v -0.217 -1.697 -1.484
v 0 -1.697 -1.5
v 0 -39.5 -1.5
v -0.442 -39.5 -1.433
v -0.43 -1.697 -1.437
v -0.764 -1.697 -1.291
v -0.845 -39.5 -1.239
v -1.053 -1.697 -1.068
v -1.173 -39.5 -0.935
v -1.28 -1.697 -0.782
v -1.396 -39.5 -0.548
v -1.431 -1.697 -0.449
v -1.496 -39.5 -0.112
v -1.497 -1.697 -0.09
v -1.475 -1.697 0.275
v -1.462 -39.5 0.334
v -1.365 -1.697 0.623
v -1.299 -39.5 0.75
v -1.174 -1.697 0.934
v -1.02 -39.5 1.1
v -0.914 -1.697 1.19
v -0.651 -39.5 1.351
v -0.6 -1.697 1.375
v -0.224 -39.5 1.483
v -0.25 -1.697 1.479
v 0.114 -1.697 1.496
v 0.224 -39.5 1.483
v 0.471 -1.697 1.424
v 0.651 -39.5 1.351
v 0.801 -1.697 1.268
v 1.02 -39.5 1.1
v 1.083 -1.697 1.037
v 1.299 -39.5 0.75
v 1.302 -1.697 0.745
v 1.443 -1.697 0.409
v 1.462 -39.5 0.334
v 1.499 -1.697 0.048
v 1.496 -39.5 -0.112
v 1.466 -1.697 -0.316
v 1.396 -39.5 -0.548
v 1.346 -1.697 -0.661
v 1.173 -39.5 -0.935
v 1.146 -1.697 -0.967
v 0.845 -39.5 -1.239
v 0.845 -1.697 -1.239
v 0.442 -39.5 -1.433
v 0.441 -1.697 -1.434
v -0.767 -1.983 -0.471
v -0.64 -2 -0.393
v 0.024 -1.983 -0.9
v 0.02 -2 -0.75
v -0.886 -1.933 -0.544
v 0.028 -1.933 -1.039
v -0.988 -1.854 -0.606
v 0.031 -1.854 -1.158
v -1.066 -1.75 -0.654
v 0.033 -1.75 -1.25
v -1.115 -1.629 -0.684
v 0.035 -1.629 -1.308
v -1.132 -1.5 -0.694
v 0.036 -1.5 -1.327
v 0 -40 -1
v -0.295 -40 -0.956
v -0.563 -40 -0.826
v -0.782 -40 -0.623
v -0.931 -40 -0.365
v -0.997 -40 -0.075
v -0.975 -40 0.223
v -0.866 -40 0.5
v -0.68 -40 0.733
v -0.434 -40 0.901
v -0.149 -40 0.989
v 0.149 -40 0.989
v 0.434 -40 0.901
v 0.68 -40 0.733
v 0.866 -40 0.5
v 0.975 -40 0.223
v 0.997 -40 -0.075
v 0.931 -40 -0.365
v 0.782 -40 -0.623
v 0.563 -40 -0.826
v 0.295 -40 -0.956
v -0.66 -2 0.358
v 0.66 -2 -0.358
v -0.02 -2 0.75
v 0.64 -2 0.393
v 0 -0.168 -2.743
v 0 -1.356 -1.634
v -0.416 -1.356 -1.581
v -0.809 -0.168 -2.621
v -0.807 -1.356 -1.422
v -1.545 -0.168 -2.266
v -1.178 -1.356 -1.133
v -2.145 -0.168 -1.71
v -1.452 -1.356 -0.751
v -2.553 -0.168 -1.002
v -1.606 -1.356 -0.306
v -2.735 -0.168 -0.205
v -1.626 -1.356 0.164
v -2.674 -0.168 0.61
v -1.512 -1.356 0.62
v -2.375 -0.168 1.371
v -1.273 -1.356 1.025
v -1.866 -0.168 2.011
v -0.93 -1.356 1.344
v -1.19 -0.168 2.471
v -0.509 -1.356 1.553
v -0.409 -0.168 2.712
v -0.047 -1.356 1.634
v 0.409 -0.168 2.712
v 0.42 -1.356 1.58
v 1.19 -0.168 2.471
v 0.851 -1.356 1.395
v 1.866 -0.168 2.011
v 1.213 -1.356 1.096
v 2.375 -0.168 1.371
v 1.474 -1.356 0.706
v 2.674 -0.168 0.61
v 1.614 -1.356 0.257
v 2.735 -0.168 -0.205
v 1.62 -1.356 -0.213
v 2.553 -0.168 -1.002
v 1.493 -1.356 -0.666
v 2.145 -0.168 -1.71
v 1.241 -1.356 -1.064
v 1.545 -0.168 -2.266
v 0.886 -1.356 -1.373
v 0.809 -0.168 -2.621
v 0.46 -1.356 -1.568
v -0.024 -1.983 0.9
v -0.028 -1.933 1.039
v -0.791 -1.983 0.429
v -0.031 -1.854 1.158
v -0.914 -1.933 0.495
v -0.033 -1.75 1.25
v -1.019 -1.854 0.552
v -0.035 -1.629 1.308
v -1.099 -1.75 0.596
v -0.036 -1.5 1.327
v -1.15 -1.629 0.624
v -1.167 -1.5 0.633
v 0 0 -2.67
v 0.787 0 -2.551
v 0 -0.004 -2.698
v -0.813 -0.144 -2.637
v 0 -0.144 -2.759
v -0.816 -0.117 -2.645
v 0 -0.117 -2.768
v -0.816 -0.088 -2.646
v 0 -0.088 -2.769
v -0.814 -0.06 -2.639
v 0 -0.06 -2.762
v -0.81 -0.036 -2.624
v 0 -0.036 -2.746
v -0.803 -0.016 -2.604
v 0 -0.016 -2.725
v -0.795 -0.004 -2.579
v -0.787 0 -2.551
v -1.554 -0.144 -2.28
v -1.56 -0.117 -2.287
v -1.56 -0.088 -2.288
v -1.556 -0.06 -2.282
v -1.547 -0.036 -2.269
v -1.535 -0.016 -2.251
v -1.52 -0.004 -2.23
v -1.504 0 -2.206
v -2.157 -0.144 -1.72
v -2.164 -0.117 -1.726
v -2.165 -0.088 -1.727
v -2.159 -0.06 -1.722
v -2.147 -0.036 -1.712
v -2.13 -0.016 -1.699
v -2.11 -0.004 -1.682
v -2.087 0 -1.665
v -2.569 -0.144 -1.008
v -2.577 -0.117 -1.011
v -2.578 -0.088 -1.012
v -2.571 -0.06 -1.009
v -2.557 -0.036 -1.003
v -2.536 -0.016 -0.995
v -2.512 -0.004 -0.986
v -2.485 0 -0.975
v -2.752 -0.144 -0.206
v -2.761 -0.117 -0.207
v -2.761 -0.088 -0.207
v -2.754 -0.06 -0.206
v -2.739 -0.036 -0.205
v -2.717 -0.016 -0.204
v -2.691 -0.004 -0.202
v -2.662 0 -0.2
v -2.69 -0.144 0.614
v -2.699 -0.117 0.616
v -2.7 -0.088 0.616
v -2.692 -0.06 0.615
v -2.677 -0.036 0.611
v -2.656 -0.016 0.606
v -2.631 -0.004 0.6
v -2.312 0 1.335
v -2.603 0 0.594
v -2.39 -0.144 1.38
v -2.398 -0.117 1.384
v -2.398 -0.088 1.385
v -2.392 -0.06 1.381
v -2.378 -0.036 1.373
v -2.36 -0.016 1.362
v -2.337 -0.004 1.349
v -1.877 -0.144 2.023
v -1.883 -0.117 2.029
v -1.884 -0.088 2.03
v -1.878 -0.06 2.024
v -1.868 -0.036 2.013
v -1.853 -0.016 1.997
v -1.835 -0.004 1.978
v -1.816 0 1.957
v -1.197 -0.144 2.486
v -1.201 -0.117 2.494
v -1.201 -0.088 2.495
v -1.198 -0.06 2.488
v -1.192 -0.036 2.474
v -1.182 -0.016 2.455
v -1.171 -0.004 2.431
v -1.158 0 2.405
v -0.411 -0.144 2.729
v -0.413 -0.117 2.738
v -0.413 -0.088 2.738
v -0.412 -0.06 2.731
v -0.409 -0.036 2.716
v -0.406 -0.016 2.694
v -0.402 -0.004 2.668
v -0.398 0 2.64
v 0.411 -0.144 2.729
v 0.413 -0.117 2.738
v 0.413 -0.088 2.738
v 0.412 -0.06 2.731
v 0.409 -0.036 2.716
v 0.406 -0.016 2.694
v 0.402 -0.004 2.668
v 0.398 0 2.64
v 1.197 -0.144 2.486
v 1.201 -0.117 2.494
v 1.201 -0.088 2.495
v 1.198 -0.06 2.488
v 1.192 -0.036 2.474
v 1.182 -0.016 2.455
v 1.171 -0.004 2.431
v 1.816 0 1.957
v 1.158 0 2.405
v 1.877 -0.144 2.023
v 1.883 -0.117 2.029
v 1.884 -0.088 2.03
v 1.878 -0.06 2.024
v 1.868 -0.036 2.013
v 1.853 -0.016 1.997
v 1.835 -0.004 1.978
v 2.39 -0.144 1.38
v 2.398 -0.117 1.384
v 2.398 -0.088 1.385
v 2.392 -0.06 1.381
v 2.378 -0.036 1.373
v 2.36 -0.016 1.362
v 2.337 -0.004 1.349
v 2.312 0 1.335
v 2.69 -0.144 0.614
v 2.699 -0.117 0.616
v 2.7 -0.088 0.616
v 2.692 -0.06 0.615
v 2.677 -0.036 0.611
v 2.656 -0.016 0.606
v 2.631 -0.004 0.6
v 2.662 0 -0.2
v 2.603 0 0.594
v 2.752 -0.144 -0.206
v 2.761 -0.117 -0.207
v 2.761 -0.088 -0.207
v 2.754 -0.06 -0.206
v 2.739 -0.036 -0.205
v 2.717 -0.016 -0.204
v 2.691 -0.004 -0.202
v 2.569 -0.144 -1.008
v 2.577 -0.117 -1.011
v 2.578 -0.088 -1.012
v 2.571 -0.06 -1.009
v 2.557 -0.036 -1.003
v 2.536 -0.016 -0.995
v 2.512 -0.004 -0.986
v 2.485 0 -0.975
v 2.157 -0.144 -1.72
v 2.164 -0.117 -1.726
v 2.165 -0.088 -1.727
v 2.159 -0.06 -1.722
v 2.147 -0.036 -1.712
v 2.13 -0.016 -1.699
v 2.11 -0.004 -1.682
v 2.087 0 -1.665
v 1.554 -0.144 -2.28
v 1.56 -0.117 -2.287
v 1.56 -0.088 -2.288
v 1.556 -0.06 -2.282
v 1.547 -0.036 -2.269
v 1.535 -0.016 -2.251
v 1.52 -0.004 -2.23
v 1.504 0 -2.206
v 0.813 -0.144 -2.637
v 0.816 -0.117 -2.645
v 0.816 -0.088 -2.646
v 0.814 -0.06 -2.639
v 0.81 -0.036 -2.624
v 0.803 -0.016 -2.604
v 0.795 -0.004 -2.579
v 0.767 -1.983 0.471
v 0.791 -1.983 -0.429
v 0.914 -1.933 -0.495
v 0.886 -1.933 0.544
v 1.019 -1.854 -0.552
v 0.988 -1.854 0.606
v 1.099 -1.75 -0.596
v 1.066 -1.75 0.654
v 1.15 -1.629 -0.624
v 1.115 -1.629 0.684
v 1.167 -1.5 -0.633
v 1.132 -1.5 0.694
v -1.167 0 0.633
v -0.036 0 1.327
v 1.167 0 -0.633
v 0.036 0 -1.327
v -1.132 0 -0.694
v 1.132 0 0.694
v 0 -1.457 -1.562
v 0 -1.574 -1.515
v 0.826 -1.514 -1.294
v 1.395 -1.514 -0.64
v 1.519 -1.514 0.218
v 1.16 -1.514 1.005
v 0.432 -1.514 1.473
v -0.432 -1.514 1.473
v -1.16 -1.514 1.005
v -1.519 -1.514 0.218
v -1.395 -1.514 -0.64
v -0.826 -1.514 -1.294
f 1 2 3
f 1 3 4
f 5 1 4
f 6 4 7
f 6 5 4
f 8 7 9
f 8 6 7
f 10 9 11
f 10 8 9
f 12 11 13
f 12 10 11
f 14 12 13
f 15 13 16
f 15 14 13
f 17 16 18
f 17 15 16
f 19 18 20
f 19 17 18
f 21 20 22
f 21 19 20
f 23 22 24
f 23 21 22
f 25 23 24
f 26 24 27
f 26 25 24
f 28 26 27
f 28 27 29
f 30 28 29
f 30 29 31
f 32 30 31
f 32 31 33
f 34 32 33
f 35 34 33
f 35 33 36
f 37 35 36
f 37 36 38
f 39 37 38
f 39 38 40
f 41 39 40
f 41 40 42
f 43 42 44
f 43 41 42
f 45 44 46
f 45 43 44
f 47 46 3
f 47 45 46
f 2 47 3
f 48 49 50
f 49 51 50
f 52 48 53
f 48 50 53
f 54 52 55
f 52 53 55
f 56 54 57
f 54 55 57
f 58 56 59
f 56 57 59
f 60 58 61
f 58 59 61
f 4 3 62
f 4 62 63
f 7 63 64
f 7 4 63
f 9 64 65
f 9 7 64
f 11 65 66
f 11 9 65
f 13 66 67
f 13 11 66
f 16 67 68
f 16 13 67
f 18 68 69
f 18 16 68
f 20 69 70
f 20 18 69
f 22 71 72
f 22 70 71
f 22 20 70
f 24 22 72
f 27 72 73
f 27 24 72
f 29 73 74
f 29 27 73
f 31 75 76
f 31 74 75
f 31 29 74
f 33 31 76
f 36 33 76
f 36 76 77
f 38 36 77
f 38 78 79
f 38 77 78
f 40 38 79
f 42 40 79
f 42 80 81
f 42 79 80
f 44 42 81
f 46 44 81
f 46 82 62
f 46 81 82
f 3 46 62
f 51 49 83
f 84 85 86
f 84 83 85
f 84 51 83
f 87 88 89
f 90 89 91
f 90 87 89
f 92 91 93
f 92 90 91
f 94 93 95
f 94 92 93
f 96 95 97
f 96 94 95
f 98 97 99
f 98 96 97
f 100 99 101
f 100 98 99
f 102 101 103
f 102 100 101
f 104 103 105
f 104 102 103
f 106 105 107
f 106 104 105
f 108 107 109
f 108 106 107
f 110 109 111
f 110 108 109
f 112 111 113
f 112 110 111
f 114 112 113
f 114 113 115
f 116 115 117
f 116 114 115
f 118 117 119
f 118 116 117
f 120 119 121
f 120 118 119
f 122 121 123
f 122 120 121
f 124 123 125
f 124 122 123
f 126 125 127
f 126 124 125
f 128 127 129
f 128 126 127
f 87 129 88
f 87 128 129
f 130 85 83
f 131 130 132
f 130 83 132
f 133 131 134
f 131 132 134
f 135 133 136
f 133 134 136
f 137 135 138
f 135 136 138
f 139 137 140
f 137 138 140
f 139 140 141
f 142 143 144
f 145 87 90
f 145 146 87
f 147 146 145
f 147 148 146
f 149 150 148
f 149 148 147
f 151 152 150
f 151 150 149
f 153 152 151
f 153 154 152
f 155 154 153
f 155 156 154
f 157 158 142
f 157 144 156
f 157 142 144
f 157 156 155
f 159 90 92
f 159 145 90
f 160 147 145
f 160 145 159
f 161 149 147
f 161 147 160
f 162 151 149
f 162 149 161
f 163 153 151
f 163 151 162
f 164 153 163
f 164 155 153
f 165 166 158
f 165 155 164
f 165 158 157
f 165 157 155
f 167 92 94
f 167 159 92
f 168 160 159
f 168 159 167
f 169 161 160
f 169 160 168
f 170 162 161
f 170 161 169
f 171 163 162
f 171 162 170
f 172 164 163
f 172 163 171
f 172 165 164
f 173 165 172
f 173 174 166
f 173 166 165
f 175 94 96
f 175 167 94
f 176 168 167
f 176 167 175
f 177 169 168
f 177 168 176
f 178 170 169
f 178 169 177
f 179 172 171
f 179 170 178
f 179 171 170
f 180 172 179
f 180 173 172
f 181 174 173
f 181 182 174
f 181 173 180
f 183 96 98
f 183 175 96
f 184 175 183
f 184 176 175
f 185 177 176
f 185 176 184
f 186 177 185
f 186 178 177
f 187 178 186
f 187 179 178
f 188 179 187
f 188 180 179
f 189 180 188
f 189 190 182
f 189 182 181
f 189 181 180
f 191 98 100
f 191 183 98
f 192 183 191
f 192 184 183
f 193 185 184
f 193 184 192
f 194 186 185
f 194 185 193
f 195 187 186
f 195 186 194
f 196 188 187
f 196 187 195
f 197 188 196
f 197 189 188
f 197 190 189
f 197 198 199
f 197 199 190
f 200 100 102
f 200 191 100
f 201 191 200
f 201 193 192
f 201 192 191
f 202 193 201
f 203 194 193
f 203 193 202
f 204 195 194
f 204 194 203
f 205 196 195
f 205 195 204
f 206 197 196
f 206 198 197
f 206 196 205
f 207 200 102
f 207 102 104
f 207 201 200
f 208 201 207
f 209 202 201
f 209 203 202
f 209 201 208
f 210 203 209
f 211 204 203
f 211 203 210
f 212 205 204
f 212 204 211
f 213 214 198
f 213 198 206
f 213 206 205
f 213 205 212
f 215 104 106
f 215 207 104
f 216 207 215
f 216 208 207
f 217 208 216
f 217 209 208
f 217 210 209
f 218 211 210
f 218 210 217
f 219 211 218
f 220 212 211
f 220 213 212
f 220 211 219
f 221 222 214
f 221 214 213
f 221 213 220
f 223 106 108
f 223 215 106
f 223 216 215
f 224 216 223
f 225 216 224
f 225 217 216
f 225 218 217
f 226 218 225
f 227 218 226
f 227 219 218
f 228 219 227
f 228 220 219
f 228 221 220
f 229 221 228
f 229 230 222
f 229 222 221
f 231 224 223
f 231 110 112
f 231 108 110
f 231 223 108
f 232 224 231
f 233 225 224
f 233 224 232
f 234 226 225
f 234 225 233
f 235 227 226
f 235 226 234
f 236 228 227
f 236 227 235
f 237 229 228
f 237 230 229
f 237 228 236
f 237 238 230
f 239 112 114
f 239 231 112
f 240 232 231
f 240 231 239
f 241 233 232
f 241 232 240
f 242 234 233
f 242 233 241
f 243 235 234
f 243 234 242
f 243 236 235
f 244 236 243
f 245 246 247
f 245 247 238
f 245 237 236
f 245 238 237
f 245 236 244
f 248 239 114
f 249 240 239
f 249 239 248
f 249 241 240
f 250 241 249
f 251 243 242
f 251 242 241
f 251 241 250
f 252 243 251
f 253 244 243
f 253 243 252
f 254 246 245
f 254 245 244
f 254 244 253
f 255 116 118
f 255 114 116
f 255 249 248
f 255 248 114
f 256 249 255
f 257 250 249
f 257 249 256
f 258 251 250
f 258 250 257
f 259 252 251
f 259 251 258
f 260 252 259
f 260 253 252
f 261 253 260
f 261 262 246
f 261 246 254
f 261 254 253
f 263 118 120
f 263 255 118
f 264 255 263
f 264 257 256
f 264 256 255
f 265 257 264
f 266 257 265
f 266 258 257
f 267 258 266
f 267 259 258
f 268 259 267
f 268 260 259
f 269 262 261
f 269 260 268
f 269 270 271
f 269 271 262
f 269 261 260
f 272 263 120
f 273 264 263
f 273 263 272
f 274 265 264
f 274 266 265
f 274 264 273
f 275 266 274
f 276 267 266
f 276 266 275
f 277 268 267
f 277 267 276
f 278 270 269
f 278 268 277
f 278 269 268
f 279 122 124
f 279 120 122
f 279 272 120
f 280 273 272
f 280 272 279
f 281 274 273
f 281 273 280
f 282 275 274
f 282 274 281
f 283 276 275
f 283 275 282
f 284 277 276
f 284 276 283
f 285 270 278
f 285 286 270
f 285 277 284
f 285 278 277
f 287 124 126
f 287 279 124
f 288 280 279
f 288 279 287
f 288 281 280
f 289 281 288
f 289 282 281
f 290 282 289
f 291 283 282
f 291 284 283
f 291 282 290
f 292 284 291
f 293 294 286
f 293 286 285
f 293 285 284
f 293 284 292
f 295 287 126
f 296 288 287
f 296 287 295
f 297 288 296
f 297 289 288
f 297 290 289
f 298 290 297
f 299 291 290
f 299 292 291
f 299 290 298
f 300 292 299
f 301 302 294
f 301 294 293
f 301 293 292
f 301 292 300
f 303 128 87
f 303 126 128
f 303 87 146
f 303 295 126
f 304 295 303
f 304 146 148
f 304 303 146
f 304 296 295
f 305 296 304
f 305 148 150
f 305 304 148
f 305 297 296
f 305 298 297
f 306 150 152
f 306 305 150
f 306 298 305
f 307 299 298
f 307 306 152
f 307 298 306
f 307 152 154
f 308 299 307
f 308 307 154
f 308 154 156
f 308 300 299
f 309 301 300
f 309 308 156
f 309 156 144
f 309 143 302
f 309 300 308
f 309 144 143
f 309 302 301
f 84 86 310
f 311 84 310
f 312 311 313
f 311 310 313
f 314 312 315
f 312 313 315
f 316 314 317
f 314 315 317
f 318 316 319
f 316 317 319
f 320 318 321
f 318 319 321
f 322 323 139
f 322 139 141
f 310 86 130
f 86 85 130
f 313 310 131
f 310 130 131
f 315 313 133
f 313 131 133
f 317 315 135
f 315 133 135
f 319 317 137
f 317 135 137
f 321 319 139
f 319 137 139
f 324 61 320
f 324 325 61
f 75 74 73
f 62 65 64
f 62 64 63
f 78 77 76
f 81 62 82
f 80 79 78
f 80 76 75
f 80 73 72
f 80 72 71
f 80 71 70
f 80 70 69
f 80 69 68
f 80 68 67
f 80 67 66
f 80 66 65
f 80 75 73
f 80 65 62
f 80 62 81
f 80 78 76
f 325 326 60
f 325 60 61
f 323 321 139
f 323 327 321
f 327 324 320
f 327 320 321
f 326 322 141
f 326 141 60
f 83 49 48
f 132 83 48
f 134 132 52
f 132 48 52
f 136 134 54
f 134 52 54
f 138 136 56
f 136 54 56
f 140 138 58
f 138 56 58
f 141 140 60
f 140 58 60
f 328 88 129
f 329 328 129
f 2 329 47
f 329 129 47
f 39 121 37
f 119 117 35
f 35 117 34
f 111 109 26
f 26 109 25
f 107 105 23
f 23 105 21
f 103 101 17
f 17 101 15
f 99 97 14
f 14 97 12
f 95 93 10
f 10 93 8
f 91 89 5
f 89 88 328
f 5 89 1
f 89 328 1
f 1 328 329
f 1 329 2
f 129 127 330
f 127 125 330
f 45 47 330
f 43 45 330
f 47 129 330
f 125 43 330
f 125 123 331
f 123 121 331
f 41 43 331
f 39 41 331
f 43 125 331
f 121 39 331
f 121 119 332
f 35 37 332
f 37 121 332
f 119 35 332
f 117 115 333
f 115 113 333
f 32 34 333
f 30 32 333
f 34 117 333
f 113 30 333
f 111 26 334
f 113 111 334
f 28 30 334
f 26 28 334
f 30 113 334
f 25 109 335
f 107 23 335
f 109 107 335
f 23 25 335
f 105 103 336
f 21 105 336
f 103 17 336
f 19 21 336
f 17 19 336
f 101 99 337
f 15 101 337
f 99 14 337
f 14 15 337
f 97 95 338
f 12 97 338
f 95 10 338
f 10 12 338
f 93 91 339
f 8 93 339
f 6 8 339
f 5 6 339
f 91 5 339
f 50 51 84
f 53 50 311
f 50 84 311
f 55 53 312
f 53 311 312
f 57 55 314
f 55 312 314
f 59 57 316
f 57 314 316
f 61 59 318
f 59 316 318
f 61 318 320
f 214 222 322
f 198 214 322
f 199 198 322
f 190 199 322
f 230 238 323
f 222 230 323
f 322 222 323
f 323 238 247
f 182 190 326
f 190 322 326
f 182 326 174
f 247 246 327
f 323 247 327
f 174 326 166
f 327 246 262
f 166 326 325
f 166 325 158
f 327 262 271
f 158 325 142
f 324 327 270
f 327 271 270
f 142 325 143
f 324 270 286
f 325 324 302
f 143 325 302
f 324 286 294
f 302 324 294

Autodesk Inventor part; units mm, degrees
ref_plane "YZ Plane" through (0, 0, 0) normal (1, 0, 0) x (0, 1, 0)
ref_plane "XZ Plane" through (0, 0, 0) normal (0, 1, 0) x (-1, 0, 0)
ref_plane "XY Plane" through (0, 0, 0) normal (0, 0, 1) x (1, 0, 0)
sketch "Szkic2" plane through (0, 0, 0) normal (1, 0, 0) x (0, 1, 0)
  line L0 (0, -2.9) -> (0, 2.9)
  line L1 (-1.5, -1.5) -> (-1.5, 1.5)
  line L2 (-1.5, -1.5) -> (0, -2.9)
  line L3 (-1.5, 1.5) -> (0, 2.9)
  line L4 (0, 0) -> (-40, 0)
  line L5 (-40, 0) -> (-40, -1.5)
  line L6 (-40, -1.5) -> (-1.5, -1.5)
  dimension "d0" = 5.8
  dimension "d2" = 3
  dimension "d3" = 1.5
  dimension "d4" = 40
  dimension "d5" = 1.5
revolve "Obrót1" add sketch "Szkic2" angle 360 about axis through (0, 0, 0) along (0, -1, 0) contours L2 L1 L4 L0 | L6 L5 L4 L1
sketch "Szkic3" plane through (0, 0, 0) normal (0, 1, 0) x (1, 0, 0)
  line L0 (-1.1673, -0.633) -> (-1.1318, 0.6945)
  line L1 (-1.1318, 0.6945) -> (0.0355, 1.3274)
  line L2 (0.0355, 1.3274) -> (1.1673, 0.633)
  line L3 (1.1673, 0.633) -> (1.1318, -0.6945)
  line L4 (1.1318, -0.6945) -> (-0.0355, -1.3274)
  line L5 (-0.0355, -1.3274) -> (-1.1673, -0.633)
  point P0 (0, 0)
  point P1 (0, 0)
  dimension "d7" = 2.3
extrude "Wyciągnięcie proste1" cut sketch "Szkic3" against normal blind 2
fillet "Zaokrąglenie1" radius 0.5 6 edges at (-1.1496, -2, -0.0308) (-0.6014, -2, 0.9802) (-0.5482, -2, -1.011) (0.6014, -2, -0.9802) (0.5482, -2, 1.011) (1.1496, -2, 0.0308)
fillet "Zaokrąglenie2" radius 0.5 1 edges at (0, -1.5, 1.5)
fillet "Zaokrąglenie3" radius 0.1 1 edges at (0, 0, 2.9)
thread "Gwint1" size "M3x0.5" class "6g" standard "ANSI Metric M Profile" full length
chamfer "Faza1" distance 0.5 angle 45 1 edges at (0, -40, 1.5)
properties part number "Screw M3 40mm flat head"
